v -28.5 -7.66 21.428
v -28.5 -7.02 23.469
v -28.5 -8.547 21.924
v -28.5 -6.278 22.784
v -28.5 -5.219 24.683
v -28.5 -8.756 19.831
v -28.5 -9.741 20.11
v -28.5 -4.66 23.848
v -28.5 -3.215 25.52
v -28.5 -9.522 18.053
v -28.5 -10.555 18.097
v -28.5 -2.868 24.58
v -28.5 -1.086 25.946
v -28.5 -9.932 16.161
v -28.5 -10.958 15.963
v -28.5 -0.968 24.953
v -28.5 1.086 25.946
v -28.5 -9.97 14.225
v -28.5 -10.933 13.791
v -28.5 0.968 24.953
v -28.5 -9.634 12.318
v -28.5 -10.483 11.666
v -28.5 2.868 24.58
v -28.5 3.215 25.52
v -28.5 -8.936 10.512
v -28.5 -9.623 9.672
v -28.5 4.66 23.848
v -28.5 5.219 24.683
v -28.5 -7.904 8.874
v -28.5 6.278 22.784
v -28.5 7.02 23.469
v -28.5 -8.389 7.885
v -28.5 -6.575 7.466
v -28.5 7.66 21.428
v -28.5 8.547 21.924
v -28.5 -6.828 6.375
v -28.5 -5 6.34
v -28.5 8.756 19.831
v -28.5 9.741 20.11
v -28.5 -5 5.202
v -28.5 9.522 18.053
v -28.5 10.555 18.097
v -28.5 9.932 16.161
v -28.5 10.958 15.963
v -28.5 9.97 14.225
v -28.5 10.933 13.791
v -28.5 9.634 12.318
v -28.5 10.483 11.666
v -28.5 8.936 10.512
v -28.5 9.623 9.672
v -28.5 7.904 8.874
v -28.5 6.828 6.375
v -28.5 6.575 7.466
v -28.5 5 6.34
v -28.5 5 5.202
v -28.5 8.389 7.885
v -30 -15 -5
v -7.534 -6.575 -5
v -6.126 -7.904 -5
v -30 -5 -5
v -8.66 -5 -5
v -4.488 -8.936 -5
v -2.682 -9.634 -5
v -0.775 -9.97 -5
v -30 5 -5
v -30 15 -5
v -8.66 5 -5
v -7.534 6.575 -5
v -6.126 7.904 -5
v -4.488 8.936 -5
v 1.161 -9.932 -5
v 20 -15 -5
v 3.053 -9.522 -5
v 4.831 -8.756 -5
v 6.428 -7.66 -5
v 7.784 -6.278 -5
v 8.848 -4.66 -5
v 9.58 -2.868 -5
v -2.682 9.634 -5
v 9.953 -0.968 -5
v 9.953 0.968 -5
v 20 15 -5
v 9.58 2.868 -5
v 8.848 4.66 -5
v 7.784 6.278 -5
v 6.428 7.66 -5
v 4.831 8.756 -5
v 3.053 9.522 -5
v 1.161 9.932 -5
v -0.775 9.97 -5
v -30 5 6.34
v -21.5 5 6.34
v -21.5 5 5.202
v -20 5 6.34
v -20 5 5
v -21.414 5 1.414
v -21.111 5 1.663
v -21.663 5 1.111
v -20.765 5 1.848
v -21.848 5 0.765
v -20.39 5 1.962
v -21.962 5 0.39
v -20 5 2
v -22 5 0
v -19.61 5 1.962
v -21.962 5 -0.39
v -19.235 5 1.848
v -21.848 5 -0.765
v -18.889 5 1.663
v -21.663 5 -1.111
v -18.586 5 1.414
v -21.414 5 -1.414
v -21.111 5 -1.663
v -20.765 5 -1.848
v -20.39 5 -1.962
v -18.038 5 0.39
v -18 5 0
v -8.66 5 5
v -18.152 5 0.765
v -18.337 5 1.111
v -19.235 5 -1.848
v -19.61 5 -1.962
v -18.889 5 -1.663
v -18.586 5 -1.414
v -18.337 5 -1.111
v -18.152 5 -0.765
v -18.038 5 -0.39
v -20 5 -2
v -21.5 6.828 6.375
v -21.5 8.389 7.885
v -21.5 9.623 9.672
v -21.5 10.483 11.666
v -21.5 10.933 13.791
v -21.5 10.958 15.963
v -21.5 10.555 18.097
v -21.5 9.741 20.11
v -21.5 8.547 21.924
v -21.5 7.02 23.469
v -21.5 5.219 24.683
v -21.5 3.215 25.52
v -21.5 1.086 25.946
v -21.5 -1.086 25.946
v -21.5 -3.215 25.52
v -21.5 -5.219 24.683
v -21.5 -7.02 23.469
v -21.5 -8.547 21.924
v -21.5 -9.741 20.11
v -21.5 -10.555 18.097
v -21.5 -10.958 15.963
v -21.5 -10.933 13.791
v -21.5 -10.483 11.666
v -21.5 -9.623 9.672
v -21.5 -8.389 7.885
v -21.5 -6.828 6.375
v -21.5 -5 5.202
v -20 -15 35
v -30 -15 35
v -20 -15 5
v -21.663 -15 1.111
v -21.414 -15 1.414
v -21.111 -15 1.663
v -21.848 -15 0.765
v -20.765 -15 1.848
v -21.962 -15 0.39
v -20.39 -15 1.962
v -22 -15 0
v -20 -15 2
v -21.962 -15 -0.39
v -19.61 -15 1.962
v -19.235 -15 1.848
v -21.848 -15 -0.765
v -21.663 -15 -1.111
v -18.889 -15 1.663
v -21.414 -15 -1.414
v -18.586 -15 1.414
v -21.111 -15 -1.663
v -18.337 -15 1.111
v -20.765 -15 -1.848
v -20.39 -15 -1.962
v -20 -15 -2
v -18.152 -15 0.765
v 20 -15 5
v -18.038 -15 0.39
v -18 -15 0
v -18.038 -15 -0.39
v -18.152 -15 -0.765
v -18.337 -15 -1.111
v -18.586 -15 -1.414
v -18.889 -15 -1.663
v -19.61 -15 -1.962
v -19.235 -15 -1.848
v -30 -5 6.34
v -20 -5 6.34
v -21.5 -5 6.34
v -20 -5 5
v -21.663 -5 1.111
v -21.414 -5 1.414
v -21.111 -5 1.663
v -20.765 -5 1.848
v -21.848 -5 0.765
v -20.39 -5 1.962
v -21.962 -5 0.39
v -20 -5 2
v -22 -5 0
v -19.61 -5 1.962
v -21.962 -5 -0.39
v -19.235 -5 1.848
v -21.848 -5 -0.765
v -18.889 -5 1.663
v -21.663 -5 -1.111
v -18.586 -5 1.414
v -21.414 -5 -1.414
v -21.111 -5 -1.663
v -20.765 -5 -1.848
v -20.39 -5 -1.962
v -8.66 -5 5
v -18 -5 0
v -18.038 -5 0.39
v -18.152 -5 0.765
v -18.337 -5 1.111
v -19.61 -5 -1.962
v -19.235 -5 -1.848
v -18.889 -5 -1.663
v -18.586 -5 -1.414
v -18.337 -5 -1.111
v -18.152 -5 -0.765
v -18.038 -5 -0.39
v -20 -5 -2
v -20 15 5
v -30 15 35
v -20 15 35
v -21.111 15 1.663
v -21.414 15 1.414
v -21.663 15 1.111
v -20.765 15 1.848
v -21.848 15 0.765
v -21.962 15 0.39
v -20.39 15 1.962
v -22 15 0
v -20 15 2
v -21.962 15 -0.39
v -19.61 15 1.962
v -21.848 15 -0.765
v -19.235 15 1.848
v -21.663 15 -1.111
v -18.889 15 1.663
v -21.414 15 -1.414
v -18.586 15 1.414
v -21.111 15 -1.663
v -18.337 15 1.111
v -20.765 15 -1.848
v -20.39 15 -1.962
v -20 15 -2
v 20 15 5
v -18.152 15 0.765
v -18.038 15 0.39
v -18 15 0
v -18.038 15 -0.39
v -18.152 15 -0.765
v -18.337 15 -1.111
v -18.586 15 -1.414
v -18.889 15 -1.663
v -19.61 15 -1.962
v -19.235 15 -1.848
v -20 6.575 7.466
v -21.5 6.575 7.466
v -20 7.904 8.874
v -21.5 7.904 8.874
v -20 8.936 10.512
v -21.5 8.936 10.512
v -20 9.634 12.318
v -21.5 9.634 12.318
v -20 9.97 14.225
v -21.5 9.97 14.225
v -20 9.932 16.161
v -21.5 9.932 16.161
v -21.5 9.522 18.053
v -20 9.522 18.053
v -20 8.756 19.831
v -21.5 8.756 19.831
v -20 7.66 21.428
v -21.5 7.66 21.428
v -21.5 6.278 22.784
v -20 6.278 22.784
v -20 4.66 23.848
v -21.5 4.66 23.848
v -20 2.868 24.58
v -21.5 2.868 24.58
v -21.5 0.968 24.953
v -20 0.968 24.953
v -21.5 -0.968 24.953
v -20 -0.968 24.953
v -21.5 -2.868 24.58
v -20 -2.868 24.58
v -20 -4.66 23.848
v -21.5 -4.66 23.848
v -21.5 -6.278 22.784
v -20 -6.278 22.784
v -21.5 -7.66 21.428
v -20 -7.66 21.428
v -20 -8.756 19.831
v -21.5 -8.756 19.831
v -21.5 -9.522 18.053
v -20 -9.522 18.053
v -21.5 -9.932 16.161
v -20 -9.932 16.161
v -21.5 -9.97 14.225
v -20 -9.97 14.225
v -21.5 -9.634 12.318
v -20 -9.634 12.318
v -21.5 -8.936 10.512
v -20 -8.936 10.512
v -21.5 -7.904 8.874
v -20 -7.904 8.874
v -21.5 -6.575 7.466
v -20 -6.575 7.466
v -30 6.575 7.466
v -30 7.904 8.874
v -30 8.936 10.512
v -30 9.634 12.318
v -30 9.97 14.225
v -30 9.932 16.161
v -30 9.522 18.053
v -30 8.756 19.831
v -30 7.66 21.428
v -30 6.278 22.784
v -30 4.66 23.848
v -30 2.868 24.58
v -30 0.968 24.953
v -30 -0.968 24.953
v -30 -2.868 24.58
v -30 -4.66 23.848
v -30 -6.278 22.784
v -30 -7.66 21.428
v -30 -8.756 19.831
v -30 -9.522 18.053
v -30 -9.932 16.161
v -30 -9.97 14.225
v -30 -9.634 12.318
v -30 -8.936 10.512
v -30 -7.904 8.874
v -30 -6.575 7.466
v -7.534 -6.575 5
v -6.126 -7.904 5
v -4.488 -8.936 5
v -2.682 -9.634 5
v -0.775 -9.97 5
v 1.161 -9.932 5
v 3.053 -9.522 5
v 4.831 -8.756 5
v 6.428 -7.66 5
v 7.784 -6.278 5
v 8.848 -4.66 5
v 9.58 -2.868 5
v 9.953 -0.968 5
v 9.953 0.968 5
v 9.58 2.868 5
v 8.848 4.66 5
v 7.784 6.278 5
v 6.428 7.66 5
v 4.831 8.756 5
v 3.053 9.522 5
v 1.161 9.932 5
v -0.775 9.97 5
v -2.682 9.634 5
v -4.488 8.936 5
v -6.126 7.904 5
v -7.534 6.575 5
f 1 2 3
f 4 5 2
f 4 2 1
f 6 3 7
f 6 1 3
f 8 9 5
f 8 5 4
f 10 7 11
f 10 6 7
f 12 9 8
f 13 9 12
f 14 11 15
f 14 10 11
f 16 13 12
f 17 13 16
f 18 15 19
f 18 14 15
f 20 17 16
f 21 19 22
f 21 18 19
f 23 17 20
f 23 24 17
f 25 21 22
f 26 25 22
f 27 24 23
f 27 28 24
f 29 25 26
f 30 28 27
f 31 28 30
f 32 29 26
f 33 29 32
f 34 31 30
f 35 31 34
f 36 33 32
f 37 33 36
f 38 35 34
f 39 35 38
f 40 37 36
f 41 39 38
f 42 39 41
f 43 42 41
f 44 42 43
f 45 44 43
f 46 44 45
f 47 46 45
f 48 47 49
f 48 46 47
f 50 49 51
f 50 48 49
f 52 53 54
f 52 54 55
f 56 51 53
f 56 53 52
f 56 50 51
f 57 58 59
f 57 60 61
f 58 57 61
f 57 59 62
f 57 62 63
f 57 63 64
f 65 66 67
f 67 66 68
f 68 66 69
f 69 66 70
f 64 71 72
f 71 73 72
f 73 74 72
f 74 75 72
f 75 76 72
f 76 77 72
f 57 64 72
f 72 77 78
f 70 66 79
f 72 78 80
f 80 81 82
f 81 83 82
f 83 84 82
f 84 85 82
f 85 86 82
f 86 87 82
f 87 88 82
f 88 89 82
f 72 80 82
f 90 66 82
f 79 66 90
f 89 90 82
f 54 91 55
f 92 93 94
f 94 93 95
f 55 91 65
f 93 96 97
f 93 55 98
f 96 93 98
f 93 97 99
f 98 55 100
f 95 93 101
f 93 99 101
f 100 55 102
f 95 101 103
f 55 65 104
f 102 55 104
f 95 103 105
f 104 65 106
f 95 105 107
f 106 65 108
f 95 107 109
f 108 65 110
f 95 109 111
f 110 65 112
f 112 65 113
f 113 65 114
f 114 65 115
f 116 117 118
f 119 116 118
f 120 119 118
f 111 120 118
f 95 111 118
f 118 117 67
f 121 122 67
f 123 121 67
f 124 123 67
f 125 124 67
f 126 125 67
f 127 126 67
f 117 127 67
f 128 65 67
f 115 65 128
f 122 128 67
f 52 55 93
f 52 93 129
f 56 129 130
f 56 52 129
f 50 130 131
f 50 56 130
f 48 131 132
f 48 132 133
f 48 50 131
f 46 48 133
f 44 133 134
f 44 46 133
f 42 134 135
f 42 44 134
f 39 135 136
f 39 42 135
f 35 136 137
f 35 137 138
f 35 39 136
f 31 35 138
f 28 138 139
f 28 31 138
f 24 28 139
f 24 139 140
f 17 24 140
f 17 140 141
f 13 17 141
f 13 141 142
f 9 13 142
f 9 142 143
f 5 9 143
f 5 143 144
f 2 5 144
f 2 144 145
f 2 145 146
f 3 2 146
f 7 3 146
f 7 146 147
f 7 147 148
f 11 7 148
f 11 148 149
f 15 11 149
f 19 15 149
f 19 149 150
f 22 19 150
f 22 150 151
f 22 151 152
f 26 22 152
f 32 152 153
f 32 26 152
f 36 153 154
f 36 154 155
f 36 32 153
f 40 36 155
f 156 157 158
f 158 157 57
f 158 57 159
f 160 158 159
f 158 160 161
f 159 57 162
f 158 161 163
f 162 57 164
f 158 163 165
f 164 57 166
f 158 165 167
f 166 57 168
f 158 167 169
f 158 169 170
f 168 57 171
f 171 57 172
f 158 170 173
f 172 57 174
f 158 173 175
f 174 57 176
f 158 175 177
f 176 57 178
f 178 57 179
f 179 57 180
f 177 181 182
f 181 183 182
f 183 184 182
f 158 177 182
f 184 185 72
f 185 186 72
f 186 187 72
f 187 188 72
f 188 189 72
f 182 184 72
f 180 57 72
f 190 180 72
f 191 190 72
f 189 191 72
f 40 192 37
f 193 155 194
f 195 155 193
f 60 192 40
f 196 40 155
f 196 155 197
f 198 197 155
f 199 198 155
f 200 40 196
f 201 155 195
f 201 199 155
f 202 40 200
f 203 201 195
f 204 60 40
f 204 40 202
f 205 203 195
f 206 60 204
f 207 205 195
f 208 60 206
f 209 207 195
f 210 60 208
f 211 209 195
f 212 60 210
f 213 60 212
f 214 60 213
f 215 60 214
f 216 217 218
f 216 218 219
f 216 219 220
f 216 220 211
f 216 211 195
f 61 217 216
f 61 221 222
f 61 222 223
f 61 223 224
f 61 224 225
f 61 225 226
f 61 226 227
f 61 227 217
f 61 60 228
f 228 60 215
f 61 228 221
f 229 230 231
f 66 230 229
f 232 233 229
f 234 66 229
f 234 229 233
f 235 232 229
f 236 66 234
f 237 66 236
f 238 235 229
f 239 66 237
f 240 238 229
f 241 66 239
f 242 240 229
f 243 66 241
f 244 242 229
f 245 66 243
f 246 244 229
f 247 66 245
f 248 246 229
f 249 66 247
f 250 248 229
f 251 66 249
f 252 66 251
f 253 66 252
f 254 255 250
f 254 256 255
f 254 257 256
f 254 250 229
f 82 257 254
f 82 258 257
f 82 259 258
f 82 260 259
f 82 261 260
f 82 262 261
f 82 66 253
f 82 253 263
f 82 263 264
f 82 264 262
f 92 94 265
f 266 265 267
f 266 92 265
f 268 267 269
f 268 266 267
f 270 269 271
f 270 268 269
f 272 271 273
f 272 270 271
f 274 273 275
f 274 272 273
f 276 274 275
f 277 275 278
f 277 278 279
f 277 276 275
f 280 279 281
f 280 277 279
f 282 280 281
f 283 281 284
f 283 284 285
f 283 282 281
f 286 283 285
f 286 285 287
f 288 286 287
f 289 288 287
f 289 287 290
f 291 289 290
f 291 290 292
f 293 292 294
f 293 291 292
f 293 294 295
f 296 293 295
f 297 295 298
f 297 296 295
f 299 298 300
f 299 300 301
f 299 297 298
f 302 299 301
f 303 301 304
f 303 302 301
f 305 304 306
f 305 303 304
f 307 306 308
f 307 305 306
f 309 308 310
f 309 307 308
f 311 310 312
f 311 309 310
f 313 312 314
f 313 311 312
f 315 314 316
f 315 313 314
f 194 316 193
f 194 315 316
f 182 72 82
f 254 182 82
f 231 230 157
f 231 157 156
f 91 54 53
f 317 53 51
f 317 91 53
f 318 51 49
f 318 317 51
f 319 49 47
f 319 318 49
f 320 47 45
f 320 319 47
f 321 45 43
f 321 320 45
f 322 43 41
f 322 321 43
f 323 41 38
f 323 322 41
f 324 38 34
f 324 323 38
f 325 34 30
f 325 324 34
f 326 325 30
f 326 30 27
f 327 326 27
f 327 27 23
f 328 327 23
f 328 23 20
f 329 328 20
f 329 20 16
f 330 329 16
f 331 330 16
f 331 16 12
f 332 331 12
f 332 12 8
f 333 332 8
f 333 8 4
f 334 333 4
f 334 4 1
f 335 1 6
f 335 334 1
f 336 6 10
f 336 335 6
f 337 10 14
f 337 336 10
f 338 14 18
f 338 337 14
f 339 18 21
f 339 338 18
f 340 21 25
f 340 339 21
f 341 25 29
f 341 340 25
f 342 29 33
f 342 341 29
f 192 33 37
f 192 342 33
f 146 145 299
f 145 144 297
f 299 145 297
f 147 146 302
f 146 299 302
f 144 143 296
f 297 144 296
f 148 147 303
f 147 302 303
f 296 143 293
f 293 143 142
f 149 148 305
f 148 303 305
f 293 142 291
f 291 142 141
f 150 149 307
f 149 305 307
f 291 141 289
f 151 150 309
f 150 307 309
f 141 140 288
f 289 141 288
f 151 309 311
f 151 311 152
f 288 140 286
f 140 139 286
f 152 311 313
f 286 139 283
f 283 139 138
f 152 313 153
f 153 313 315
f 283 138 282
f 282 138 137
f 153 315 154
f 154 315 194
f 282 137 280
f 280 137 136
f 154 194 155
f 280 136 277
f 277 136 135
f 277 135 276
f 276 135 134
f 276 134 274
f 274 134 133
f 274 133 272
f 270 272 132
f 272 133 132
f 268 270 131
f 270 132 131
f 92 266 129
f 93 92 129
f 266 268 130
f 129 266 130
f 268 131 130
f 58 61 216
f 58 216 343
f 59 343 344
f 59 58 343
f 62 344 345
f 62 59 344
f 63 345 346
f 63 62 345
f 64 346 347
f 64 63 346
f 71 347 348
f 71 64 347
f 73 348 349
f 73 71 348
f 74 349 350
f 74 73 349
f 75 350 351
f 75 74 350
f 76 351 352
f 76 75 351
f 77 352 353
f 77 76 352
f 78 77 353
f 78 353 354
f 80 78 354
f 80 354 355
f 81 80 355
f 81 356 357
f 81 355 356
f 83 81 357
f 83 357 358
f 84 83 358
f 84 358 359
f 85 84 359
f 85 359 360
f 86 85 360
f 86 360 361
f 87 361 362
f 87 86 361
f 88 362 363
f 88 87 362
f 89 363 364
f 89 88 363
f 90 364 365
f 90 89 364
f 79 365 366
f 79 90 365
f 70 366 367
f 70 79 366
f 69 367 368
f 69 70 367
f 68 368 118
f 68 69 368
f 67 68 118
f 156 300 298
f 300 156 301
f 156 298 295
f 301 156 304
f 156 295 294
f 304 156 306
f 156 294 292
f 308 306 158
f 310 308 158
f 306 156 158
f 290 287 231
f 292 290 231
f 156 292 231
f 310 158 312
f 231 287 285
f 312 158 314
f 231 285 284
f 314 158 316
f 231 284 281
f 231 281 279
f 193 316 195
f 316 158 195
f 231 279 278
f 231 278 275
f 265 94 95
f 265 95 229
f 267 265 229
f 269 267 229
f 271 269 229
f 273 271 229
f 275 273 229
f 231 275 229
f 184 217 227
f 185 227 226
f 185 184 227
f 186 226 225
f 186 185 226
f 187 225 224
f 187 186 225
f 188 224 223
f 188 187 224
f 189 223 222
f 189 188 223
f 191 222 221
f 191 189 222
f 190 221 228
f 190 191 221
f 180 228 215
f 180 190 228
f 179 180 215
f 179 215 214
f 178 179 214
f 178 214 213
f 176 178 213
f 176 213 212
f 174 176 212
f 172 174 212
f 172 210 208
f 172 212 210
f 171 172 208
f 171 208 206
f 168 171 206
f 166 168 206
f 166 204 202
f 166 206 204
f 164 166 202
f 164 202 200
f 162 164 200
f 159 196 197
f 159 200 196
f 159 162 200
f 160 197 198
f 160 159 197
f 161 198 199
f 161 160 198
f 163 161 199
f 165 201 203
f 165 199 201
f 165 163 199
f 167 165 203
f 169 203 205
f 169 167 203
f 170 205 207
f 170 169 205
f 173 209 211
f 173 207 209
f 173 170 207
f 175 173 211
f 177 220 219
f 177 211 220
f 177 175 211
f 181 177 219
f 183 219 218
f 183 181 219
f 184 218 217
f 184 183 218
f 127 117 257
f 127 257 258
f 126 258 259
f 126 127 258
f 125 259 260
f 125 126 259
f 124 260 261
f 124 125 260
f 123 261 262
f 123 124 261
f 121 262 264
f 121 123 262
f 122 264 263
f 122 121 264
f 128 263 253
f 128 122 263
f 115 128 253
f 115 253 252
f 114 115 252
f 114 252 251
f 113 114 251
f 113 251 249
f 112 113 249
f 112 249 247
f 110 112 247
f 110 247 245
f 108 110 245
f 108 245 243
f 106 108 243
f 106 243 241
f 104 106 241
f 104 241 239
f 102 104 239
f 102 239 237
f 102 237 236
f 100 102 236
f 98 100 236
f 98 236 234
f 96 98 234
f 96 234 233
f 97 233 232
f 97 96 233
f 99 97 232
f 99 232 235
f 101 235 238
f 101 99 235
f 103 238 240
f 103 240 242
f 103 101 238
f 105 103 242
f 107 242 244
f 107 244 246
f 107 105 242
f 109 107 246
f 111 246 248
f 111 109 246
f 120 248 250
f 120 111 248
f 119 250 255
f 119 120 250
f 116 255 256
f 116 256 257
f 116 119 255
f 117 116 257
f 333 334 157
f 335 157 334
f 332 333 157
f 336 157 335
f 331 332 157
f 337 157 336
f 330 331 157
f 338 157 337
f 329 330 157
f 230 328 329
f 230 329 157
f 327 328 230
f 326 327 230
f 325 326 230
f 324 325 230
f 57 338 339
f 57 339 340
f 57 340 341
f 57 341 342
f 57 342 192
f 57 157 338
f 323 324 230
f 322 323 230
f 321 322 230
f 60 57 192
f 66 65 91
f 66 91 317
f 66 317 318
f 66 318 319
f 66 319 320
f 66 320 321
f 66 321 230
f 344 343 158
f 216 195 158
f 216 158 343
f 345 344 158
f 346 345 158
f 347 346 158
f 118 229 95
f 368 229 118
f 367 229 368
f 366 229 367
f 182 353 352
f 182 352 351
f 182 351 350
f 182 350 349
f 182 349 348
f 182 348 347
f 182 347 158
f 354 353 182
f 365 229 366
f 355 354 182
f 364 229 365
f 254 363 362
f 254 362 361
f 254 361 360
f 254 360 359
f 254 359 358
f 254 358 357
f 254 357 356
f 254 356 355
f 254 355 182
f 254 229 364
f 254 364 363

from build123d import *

# Parameters (mm, degrees)
CYLINDER_R              = 10
CYLINDER_DEPTH          = 10
CYLINDER001_R           = 2
CYLINDER001_DEPTH       = 30
CYLINDER001_ROLL_ANGLE  = -90
CYLINDER002_R           = 11
CYLINDER002_DEPTH       = 7
CYLINDER002_PITCH_ANGLE = 90
CYLINDER003_R           = 10
CYLINDER003_DEPTH       = 10
CYLINDER003_PITCH_ANGLE = 90
BOX001_W                = 25
BOX001_H                = 10
BOX001_DEPTH            = 15
BOX002_W                = 10
BOX002_H                = 30
BOX002_DEPTH            = 40
BOX_W                   = 40
BOX_H                   = 30
BOX_DEPTH               = 10


with BuildPart() as cylinder:
    # Cylinder → Cylinder (new body)
    with BuildSketch(Plane.XY.offset(-5)):
        Circle(CYLINDER_R)
    extrude(amount=CYLINDER_DEPTH)


with BuildPart() as cylinder001:
    # Cylinder001 → Cylinder001 (new body)
    with BuildSketch(Plane.XY):
        Circle(CYLINDER001_R)
    extrude(amount=CYLINDER001_DEPTH)


with BuildPart() as cylinder001_1:
    # Cylinder001 roll: moved
    add(cylinder001.part.rotate(Axis((0, 0, 0), (1, 0, 0)), CYLINDER001_ROLL_ANGLE))


with BuildPart() as cylinder001_2:
    # Cylinder001 placement: moved
    add(cylinder001_1.part.moved(Location((-20, -15, 0))))


with BuildPart() as bearing_cylinder:
    # Cylinder002 → Cylinder002 (new body)
    with BuildSketch(Plane.XY):
        Circle(CYLINDER002_R)
    extrude(amount=CYLINDER002_DEPTH)


with BuildPart() as bearing_cylinder_1:
    # Cylinder002 pitch: moved
    add(bearing_cylinder.part.rotate(Axis((0, 0, 0), (0, 1, 0)), CYLINDER002_PITCH_ANGLE))


with BuildPart() as bearing_cylinder_2:
    # Cylinder002 placement: moved
    add(bearing_cylinder_1.part.moved(Location((-28.5, 0, 15))))


with BuildPart() as bearing_cylinder_outer:
    # Cylinder003 → Cylinder003 (new body)
    with BuildSketch(Plane.XY):
        Circle(CYLINDER003_R)
    extrude(amount=CYLINDER003_DEPTH)


with BuildPart() as bearing_cylinder_outer_1:
    # Cylinder003 pitch: moved
    add(bearing_cylinder_outer.part.rotate(Axis((0, 0, 0), (0, 1, 0)), CYLINDER003_PITCH_ANGLE))


with BuildPart() as bearing_cylinder_outer_2:
    # Cylinder003 placement: moved
    add(bearing_cylinder_outer_1.part.moved(Location((-30, 0, 15))))


with BuildPart() as negative_fusion:
    # Box001 → Box001 (new body)
    with BuildSketch(Plane(origin=(-30, -5, -5), x_dir=(1, 0, 0), z_dir=(0, 0, 1))):
        with Locations((12.5, 5)):
            Rectangle(BOX001_W, BOX001_H)
    extrude(amount=BOX001_DEPTH)

    # Fusion: union Cylinder, Cylinder001, Bearing Cylinder, Bearing Cylinder Outer
    add(cylinder.part)
    add(cylinder001_2.part)
    add(bearing_cylinder_2.part)
    add(bearing_cylinder_outer_2.part)


with BuildPart() as cube002:
    # Box002 → Box002 (new body)
    with BuildSketch(Plane(origin=(-30, -15, -5), x_dir=(1, 0, 0), z_dir=(0, 0, 1))):
        with Locations((5, 15)):
            Rectangle(BOX002_W, BOX002_H)
    extrude(amount=BOX002_DEPTH)


with BuildPart() as cut:
    # Box → Box (new body)
    with BuildSketch(Plane(origin=(-20, -15, -5), x_dir=(1, 0, 0), z_dir=(0, 0, 1))):
        with Locations((20, 15)):
            Rectangle(BOX_W, BOX_H)
    extrude(amount=BOX_DEPTH)

    # Fusion001: union Cube002
    add(cube002.part)

    # Cut: cut Negative Fusion
    add(negative_fusion.part, mode=Mode.SUBTRACT)


solid = cut.part
